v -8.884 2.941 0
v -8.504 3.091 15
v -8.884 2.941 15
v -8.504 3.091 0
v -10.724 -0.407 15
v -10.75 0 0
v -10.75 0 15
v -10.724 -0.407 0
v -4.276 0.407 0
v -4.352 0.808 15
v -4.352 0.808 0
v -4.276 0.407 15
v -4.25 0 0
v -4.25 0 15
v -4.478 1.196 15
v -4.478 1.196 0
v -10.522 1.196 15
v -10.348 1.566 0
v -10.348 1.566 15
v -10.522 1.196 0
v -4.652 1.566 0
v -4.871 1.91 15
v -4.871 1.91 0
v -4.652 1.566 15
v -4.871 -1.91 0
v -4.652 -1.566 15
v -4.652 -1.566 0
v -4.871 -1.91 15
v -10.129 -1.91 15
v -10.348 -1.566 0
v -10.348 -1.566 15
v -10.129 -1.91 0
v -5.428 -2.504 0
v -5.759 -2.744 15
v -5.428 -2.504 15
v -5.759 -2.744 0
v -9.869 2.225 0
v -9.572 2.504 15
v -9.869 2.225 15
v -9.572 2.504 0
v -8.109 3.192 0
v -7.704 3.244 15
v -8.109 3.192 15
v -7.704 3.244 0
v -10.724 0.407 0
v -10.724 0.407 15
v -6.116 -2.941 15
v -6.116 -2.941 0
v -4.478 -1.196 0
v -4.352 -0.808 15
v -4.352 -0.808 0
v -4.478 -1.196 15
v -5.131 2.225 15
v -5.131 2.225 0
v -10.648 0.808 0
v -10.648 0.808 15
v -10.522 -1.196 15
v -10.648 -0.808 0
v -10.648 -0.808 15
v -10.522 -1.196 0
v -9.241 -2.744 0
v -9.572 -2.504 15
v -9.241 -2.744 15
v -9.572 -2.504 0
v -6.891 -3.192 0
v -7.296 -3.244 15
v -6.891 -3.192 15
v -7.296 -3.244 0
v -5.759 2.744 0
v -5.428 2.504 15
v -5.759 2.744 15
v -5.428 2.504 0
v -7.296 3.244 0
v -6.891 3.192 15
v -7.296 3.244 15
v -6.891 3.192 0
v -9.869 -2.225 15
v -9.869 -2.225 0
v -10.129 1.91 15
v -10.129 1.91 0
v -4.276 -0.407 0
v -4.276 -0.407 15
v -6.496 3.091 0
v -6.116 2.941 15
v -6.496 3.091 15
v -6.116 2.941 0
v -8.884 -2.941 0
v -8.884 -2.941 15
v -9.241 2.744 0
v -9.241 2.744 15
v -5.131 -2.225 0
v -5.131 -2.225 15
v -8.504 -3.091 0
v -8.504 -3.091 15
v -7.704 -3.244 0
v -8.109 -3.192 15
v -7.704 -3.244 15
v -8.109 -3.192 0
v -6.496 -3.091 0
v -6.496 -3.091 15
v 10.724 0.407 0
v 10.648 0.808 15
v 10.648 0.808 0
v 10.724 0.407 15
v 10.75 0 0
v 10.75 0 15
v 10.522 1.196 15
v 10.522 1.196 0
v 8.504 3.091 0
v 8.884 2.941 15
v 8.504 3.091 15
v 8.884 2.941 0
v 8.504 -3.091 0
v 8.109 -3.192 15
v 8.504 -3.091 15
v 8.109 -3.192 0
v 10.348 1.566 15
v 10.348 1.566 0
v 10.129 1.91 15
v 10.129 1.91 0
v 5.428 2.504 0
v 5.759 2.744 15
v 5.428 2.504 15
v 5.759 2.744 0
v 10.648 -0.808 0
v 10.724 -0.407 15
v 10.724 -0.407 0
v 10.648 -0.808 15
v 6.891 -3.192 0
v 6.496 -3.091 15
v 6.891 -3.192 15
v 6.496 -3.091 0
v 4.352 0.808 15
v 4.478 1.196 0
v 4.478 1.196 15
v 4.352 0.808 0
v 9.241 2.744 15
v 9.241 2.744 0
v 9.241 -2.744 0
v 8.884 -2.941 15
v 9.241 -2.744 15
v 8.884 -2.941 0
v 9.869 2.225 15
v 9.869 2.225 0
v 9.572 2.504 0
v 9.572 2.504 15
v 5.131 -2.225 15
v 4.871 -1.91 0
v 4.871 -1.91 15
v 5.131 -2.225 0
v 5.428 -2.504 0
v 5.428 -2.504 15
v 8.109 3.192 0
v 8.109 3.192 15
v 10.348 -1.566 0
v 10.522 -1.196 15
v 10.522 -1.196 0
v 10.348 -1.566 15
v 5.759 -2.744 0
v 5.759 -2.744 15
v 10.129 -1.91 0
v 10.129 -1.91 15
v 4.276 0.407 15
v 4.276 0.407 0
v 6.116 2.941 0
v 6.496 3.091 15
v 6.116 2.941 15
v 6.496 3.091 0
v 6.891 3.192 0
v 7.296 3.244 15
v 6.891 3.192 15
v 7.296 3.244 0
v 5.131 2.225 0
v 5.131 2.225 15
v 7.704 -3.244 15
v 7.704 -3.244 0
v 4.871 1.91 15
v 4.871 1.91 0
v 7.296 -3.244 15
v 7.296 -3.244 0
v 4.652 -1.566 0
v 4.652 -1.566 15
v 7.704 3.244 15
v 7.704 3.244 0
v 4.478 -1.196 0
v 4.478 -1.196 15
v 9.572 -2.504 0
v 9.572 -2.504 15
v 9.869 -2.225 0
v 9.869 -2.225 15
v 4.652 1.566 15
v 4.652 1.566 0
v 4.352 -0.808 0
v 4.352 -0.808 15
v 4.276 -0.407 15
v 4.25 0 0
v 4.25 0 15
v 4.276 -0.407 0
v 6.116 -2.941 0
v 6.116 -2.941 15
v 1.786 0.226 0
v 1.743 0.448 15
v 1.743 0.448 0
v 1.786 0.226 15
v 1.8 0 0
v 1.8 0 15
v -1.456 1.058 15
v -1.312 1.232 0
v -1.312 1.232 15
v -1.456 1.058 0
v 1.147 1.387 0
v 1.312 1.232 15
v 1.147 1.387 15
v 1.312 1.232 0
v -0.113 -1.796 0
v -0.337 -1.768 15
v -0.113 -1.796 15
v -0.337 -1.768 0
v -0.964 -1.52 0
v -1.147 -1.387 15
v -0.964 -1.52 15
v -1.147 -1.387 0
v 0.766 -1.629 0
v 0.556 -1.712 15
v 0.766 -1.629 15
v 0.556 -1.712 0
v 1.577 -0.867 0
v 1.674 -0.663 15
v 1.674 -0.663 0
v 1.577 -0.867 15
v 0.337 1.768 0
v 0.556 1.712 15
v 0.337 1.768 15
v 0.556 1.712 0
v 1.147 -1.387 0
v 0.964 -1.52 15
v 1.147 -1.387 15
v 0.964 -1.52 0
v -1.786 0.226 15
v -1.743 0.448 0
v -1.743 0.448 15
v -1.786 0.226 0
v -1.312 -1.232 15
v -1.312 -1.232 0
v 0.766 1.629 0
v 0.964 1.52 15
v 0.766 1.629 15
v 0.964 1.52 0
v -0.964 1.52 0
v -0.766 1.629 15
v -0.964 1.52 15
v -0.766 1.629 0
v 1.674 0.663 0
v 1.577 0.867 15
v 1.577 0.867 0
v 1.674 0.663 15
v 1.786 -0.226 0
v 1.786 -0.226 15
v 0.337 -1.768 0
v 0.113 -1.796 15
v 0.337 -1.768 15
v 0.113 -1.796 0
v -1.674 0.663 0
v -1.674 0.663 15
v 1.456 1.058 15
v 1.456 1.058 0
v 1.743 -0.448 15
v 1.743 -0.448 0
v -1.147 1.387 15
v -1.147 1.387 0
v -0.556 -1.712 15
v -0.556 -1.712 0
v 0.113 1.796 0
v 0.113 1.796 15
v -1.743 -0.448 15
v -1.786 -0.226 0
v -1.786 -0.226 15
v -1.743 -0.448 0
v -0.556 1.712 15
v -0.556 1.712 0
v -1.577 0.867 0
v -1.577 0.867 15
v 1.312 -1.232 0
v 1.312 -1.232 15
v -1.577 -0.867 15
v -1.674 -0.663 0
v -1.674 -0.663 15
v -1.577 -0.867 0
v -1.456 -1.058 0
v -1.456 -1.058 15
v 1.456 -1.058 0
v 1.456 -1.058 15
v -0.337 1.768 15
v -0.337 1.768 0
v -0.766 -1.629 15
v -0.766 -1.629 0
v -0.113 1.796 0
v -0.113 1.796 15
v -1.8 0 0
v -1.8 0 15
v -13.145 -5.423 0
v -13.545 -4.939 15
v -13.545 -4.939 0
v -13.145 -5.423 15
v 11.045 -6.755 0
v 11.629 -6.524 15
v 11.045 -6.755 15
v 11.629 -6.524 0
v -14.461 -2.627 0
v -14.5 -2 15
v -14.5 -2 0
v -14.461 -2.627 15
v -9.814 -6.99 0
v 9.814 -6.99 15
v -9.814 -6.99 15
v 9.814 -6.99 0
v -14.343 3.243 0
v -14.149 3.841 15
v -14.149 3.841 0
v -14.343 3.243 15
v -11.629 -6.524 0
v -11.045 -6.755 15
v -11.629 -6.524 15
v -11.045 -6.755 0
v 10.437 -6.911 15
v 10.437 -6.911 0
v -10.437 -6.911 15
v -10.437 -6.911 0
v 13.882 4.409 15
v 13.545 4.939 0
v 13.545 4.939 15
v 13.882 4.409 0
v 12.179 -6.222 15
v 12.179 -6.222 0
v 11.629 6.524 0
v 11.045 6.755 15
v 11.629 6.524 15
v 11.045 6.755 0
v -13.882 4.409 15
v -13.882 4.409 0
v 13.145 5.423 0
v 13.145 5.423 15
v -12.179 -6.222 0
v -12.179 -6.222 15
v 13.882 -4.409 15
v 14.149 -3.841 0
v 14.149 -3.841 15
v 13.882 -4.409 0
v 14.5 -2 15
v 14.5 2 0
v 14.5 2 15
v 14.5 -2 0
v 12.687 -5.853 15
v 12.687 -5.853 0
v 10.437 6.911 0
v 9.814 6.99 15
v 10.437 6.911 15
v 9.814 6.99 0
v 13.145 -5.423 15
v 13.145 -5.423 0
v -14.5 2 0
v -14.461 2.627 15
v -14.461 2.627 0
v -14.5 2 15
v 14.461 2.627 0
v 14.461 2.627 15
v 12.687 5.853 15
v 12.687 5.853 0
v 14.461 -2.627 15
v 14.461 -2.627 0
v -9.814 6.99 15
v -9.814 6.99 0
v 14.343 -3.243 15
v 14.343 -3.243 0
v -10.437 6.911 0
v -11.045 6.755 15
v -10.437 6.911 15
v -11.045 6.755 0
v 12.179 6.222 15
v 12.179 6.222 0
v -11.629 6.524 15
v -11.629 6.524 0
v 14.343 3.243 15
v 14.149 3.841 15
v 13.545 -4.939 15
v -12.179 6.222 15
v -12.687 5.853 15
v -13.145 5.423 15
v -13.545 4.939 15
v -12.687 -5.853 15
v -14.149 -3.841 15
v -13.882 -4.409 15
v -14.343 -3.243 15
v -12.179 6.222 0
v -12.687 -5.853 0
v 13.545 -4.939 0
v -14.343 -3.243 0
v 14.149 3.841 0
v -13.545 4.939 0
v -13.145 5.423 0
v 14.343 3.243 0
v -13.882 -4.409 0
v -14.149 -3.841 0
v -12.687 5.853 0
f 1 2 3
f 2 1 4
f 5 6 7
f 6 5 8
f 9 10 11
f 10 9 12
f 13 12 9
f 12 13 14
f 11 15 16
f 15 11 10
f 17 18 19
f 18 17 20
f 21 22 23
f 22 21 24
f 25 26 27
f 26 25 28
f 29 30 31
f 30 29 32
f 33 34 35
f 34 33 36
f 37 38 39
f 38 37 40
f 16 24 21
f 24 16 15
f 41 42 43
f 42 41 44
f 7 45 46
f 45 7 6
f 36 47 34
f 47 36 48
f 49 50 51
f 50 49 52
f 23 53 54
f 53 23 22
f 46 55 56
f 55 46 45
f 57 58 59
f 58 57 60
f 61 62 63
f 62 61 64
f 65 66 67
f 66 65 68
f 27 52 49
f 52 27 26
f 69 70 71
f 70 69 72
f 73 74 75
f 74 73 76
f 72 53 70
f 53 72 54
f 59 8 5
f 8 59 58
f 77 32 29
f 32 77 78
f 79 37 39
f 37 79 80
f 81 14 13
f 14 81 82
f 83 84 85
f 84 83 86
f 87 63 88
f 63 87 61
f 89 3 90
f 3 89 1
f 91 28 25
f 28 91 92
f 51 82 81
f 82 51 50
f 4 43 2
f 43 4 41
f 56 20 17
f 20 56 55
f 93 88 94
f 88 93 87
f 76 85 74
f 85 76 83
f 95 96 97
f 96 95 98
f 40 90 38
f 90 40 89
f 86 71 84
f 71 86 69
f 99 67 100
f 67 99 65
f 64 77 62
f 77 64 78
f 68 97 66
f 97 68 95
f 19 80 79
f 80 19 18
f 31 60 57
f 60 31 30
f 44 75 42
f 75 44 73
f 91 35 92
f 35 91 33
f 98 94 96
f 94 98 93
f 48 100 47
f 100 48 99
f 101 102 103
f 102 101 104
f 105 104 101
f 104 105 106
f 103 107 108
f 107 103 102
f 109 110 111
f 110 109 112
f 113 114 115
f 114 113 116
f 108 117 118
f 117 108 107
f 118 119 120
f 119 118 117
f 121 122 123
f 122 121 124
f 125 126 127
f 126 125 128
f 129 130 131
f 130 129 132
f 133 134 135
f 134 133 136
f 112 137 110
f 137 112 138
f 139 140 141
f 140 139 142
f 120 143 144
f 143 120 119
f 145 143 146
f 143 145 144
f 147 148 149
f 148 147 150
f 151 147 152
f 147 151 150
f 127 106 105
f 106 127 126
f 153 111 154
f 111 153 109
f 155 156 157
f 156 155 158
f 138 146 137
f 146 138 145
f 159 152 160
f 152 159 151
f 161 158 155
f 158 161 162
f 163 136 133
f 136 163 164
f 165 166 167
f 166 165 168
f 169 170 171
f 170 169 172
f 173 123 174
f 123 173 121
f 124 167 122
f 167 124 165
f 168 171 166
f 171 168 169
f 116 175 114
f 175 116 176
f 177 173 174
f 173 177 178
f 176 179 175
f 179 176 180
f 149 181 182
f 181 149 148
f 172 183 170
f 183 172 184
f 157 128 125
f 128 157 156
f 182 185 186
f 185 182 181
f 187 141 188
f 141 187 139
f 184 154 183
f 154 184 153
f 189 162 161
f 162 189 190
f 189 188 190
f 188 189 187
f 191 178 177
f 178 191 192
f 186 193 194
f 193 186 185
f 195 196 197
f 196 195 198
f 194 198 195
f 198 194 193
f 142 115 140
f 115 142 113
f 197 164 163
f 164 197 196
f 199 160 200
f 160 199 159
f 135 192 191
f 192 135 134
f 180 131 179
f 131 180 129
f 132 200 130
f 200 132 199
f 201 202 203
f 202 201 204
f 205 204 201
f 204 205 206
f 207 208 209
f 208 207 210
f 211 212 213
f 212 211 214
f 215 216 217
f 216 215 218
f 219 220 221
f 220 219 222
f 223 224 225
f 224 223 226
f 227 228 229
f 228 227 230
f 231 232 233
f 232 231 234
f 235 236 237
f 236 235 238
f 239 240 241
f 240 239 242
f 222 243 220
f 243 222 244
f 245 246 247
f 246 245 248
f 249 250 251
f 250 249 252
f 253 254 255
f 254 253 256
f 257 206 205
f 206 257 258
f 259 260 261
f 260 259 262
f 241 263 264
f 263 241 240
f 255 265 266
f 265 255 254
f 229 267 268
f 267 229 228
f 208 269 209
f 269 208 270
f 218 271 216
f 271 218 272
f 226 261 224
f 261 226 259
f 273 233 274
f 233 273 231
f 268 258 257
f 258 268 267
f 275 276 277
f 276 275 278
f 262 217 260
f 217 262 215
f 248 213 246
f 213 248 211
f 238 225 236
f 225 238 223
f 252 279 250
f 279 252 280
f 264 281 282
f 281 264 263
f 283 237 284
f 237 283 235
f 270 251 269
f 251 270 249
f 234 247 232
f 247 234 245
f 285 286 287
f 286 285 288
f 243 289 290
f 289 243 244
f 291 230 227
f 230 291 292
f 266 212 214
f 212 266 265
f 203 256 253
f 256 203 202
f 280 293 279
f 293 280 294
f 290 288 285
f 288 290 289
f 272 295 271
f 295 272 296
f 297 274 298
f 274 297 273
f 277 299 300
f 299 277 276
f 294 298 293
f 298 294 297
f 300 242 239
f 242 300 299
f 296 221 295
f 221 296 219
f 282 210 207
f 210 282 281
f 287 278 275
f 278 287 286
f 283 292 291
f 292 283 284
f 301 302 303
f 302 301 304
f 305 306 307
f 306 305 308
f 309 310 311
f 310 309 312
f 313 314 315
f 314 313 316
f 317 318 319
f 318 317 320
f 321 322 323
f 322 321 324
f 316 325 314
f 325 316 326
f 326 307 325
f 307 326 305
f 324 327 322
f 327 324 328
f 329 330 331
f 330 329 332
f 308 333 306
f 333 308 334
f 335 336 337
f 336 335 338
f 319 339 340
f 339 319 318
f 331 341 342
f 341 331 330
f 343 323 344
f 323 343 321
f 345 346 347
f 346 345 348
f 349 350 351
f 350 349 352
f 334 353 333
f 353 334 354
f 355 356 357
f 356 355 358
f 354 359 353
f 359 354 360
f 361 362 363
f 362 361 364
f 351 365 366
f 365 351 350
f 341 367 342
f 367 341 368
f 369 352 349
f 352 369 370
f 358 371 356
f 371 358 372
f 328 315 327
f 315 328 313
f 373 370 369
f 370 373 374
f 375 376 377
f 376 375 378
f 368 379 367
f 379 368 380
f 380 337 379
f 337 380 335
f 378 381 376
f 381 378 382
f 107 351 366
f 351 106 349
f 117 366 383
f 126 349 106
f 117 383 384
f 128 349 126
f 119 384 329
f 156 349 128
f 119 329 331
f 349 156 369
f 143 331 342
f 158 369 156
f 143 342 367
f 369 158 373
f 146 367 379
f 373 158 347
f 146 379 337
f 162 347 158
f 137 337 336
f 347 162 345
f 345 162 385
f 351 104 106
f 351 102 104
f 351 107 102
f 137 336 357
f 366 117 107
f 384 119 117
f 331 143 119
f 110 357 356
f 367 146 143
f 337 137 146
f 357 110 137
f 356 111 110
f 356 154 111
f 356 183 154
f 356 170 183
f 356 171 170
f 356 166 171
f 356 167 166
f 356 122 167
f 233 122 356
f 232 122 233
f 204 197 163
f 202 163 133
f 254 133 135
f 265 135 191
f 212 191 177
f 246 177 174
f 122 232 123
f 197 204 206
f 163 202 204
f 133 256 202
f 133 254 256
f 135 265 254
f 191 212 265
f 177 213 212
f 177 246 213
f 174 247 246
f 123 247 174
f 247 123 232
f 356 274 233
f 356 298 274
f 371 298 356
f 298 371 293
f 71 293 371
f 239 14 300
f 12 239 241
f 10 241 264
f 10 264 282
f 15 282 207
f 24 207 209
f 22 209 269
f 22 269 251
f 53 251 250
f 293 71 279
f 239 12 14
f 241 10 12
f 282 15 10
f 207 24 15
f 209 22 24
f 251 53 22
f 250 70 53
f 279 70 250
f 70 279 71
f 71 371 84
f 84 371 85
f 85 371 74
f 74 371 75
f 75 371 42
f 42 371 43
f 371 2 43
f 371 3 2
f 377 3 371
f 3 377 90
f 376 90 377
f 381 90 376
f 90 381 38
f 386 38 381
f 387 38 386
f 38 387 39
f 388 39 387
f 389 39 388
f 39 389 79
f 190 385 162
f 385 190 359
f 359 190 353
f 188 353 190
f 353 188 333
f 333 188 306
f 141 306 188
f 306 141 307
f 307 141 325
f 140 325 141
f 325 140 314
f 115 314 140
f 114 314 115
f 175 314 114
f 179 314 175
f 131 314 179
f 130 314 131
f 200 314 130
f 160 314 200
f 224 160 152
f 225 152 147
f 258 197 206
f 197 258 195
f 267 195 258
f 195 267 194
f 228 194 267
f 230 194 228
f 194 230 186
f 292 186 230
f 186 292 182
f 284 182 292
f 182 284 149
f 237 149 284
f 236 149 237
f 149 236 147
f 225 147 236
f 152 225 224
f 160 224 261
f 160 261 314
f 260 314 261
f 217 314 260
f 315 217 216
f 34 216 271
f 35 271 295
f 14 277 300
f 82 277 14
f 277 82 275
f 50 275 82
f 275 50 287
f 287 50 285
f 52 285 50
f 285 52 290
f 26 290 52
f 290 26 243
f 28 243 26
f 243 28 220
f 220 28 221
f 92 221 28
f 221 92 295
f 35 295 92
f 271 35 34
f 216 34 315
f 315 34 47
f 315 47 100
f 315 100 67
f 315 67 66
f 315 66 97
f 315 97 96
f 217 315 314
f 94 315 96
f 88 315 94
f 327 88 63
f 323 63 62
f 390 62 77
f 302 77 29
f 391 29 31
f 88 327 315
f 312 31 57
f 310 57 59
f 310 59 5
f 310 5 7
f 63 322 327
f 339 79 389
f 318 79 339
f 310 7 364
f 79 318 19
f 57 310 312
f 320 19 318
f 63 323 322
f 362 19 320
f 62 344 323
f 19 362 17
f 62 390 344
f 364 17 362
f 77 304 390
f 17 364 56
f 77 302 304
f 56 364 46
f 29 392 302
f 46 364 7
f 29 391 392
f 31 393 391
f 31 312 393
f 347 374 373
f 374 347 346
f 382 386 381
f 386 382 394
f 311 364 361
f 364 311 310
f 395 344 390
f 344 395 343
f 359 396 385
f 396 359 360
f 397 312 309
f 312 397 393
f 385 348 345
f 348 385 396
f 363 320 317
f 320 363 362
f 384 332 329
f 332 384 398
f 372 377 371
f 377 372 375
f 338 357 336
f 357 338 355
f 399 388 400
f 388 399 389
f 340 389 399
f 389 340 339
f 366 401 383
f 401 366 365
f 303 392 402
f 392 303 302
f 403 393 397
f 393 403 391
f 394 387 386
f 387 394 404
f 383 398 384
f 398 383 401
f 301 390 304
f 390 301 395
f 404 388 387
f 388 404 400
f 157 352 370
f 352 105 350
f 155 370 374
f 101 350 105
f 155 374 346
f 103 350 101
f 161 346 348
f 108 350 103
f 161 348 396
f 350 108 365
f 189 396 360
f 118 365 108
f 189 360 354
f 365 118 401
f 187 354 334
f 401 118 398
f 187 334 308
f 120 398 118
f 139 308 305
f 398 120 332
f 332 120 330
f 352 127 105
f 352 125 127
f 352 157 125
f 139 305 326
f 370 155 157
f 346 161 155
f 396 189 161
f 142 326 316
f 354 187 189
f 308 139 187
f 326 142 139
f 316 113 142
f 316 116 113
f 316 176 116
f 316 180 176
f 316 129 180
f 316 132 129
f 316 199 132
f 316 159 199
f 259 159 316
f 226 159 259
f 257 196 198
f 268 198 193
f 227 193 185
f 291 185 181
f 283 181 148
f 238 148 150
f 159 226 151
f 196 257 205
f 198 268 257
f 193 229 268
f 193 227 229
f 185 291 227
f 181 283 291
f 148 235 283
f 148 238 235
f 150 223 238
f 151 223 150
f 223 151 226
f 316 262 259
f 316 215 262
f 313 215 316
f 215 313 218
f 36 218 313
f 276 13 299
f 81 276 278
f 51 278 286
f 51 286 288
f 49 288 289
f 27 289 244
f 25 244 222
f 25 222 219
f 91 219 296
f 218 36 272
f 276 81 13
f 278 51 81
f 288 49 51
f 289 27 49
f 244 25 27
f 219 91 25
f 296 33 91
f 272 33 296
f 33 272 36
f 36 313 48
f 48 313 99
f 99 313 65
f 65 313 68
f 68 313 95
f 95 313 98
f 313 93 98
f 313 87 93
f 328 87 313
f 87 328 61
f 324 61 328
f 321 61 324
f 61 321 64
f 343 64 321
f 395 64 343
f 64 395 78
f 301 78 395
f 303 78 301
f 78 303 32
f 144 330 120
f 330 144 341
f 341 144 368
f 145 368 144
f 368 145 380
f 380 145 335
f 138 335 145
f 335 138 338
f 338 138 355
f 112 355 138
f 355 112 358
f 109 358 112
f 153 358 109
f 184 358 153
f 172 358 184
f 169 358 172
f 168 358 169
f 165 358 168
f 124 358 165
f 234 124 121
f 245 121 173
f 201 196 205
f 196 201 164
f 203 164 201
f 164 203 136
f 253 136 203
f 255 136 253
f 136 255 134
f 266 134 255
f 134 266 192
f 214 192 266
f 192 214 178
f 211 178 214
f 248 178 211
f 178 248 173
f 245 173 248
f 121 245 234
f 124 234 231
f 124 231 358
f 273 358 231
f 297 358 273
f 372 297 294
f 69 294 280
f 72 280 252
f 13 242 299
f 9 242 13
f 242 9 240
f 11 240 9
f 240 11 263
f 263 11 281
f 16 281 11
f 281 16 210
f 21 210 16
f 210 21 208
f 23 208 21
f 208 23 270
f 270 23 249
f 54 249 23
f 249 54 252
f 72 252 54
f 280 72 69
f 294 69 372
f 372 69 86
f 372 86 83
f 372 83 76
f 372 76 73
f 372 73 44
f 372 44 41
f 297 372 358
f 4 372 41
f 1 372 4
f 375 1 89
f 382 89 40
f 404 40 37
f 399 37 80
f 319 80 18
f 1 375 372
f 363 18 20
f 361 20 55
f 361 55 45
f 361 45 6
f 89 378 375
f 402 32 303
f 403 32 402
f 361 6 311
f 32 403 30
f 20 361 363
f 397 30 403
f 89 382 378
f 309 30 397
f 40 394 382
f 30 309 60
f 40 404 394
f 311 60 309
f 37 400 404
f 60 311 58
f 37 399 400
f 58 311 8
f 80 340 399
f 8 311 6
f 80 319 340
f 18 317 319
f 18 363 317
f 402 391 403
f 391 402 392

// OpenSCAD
$fn = 50;


difference() {
	union() {
		*color(alpha = 1.0000000000, c = "gray") {
			translate(v = [0, 7, 0]) {
				linear_extrude(height = 1) {
					text(font = "Arial:style=Bold", halign = "center", size = 4.5000000000, text = "COMMENT plate main", valign = "center");
				}
			}
		}
		hull() {
			translate(v = [-9.5000000000, 2.0000000000, 0]) {
				cylinder(h = 15, r = 5);
			}
			translate(v = [9.5000000000, 2.0000000000, 0]) {
				cylinder(h = 15, r = 5);
			}
			translate(v = [-9.5000000000, -2.0000000000, 0]) {
				cylinder(h = 15, r = 5);
			}
			translate(v = [9.5000000000, -2.0000000000, 0]) {
				cylinder(h = 15, r = 5);
			}
		}
	}
	union() {
		*color(alpha = 1.0000000000, c = "gray") {
			translate(v = [0, 7, 0]) {
				linear_extrude(height = 1) {
					text(font = "Arial:style=Bold", halign = "center", size = 4.5000000000, text = "COMMENT holes main", valign = "center");
				}
			}
		}
		translate(v = [-7.5000000000, 0.0000000000, 0]) {
			translate(v = [0, 0, -100]) {
				cylinder(h = 200, r = 3.2500000000);
			}
		}
		translate(v = [7.5000000000, 0.0000000000, 0]) {
			translate(v = [0, 0, -100]) {
				cylinder(h = 200, r = 3.2500000000);
			}
		}
		translate(v = [-7.5000000000, 0.0000000000, 0]) {
			translate(v = [0, 0, -100]) {
				cylinder(h = 200, r = 1.8000000000);
			}
		}
		translate(v = [0, 0, -100]) {
			cylinder(h = 200, r = 1.8000000000);
		}
		translate(v = [7.5000000000, 0.0000000000, 0]) {
			translate(v = [0, 0, -100]) {
				cylinder(h = 200, r = 1.8000000000);
			}
		}
	}
}
